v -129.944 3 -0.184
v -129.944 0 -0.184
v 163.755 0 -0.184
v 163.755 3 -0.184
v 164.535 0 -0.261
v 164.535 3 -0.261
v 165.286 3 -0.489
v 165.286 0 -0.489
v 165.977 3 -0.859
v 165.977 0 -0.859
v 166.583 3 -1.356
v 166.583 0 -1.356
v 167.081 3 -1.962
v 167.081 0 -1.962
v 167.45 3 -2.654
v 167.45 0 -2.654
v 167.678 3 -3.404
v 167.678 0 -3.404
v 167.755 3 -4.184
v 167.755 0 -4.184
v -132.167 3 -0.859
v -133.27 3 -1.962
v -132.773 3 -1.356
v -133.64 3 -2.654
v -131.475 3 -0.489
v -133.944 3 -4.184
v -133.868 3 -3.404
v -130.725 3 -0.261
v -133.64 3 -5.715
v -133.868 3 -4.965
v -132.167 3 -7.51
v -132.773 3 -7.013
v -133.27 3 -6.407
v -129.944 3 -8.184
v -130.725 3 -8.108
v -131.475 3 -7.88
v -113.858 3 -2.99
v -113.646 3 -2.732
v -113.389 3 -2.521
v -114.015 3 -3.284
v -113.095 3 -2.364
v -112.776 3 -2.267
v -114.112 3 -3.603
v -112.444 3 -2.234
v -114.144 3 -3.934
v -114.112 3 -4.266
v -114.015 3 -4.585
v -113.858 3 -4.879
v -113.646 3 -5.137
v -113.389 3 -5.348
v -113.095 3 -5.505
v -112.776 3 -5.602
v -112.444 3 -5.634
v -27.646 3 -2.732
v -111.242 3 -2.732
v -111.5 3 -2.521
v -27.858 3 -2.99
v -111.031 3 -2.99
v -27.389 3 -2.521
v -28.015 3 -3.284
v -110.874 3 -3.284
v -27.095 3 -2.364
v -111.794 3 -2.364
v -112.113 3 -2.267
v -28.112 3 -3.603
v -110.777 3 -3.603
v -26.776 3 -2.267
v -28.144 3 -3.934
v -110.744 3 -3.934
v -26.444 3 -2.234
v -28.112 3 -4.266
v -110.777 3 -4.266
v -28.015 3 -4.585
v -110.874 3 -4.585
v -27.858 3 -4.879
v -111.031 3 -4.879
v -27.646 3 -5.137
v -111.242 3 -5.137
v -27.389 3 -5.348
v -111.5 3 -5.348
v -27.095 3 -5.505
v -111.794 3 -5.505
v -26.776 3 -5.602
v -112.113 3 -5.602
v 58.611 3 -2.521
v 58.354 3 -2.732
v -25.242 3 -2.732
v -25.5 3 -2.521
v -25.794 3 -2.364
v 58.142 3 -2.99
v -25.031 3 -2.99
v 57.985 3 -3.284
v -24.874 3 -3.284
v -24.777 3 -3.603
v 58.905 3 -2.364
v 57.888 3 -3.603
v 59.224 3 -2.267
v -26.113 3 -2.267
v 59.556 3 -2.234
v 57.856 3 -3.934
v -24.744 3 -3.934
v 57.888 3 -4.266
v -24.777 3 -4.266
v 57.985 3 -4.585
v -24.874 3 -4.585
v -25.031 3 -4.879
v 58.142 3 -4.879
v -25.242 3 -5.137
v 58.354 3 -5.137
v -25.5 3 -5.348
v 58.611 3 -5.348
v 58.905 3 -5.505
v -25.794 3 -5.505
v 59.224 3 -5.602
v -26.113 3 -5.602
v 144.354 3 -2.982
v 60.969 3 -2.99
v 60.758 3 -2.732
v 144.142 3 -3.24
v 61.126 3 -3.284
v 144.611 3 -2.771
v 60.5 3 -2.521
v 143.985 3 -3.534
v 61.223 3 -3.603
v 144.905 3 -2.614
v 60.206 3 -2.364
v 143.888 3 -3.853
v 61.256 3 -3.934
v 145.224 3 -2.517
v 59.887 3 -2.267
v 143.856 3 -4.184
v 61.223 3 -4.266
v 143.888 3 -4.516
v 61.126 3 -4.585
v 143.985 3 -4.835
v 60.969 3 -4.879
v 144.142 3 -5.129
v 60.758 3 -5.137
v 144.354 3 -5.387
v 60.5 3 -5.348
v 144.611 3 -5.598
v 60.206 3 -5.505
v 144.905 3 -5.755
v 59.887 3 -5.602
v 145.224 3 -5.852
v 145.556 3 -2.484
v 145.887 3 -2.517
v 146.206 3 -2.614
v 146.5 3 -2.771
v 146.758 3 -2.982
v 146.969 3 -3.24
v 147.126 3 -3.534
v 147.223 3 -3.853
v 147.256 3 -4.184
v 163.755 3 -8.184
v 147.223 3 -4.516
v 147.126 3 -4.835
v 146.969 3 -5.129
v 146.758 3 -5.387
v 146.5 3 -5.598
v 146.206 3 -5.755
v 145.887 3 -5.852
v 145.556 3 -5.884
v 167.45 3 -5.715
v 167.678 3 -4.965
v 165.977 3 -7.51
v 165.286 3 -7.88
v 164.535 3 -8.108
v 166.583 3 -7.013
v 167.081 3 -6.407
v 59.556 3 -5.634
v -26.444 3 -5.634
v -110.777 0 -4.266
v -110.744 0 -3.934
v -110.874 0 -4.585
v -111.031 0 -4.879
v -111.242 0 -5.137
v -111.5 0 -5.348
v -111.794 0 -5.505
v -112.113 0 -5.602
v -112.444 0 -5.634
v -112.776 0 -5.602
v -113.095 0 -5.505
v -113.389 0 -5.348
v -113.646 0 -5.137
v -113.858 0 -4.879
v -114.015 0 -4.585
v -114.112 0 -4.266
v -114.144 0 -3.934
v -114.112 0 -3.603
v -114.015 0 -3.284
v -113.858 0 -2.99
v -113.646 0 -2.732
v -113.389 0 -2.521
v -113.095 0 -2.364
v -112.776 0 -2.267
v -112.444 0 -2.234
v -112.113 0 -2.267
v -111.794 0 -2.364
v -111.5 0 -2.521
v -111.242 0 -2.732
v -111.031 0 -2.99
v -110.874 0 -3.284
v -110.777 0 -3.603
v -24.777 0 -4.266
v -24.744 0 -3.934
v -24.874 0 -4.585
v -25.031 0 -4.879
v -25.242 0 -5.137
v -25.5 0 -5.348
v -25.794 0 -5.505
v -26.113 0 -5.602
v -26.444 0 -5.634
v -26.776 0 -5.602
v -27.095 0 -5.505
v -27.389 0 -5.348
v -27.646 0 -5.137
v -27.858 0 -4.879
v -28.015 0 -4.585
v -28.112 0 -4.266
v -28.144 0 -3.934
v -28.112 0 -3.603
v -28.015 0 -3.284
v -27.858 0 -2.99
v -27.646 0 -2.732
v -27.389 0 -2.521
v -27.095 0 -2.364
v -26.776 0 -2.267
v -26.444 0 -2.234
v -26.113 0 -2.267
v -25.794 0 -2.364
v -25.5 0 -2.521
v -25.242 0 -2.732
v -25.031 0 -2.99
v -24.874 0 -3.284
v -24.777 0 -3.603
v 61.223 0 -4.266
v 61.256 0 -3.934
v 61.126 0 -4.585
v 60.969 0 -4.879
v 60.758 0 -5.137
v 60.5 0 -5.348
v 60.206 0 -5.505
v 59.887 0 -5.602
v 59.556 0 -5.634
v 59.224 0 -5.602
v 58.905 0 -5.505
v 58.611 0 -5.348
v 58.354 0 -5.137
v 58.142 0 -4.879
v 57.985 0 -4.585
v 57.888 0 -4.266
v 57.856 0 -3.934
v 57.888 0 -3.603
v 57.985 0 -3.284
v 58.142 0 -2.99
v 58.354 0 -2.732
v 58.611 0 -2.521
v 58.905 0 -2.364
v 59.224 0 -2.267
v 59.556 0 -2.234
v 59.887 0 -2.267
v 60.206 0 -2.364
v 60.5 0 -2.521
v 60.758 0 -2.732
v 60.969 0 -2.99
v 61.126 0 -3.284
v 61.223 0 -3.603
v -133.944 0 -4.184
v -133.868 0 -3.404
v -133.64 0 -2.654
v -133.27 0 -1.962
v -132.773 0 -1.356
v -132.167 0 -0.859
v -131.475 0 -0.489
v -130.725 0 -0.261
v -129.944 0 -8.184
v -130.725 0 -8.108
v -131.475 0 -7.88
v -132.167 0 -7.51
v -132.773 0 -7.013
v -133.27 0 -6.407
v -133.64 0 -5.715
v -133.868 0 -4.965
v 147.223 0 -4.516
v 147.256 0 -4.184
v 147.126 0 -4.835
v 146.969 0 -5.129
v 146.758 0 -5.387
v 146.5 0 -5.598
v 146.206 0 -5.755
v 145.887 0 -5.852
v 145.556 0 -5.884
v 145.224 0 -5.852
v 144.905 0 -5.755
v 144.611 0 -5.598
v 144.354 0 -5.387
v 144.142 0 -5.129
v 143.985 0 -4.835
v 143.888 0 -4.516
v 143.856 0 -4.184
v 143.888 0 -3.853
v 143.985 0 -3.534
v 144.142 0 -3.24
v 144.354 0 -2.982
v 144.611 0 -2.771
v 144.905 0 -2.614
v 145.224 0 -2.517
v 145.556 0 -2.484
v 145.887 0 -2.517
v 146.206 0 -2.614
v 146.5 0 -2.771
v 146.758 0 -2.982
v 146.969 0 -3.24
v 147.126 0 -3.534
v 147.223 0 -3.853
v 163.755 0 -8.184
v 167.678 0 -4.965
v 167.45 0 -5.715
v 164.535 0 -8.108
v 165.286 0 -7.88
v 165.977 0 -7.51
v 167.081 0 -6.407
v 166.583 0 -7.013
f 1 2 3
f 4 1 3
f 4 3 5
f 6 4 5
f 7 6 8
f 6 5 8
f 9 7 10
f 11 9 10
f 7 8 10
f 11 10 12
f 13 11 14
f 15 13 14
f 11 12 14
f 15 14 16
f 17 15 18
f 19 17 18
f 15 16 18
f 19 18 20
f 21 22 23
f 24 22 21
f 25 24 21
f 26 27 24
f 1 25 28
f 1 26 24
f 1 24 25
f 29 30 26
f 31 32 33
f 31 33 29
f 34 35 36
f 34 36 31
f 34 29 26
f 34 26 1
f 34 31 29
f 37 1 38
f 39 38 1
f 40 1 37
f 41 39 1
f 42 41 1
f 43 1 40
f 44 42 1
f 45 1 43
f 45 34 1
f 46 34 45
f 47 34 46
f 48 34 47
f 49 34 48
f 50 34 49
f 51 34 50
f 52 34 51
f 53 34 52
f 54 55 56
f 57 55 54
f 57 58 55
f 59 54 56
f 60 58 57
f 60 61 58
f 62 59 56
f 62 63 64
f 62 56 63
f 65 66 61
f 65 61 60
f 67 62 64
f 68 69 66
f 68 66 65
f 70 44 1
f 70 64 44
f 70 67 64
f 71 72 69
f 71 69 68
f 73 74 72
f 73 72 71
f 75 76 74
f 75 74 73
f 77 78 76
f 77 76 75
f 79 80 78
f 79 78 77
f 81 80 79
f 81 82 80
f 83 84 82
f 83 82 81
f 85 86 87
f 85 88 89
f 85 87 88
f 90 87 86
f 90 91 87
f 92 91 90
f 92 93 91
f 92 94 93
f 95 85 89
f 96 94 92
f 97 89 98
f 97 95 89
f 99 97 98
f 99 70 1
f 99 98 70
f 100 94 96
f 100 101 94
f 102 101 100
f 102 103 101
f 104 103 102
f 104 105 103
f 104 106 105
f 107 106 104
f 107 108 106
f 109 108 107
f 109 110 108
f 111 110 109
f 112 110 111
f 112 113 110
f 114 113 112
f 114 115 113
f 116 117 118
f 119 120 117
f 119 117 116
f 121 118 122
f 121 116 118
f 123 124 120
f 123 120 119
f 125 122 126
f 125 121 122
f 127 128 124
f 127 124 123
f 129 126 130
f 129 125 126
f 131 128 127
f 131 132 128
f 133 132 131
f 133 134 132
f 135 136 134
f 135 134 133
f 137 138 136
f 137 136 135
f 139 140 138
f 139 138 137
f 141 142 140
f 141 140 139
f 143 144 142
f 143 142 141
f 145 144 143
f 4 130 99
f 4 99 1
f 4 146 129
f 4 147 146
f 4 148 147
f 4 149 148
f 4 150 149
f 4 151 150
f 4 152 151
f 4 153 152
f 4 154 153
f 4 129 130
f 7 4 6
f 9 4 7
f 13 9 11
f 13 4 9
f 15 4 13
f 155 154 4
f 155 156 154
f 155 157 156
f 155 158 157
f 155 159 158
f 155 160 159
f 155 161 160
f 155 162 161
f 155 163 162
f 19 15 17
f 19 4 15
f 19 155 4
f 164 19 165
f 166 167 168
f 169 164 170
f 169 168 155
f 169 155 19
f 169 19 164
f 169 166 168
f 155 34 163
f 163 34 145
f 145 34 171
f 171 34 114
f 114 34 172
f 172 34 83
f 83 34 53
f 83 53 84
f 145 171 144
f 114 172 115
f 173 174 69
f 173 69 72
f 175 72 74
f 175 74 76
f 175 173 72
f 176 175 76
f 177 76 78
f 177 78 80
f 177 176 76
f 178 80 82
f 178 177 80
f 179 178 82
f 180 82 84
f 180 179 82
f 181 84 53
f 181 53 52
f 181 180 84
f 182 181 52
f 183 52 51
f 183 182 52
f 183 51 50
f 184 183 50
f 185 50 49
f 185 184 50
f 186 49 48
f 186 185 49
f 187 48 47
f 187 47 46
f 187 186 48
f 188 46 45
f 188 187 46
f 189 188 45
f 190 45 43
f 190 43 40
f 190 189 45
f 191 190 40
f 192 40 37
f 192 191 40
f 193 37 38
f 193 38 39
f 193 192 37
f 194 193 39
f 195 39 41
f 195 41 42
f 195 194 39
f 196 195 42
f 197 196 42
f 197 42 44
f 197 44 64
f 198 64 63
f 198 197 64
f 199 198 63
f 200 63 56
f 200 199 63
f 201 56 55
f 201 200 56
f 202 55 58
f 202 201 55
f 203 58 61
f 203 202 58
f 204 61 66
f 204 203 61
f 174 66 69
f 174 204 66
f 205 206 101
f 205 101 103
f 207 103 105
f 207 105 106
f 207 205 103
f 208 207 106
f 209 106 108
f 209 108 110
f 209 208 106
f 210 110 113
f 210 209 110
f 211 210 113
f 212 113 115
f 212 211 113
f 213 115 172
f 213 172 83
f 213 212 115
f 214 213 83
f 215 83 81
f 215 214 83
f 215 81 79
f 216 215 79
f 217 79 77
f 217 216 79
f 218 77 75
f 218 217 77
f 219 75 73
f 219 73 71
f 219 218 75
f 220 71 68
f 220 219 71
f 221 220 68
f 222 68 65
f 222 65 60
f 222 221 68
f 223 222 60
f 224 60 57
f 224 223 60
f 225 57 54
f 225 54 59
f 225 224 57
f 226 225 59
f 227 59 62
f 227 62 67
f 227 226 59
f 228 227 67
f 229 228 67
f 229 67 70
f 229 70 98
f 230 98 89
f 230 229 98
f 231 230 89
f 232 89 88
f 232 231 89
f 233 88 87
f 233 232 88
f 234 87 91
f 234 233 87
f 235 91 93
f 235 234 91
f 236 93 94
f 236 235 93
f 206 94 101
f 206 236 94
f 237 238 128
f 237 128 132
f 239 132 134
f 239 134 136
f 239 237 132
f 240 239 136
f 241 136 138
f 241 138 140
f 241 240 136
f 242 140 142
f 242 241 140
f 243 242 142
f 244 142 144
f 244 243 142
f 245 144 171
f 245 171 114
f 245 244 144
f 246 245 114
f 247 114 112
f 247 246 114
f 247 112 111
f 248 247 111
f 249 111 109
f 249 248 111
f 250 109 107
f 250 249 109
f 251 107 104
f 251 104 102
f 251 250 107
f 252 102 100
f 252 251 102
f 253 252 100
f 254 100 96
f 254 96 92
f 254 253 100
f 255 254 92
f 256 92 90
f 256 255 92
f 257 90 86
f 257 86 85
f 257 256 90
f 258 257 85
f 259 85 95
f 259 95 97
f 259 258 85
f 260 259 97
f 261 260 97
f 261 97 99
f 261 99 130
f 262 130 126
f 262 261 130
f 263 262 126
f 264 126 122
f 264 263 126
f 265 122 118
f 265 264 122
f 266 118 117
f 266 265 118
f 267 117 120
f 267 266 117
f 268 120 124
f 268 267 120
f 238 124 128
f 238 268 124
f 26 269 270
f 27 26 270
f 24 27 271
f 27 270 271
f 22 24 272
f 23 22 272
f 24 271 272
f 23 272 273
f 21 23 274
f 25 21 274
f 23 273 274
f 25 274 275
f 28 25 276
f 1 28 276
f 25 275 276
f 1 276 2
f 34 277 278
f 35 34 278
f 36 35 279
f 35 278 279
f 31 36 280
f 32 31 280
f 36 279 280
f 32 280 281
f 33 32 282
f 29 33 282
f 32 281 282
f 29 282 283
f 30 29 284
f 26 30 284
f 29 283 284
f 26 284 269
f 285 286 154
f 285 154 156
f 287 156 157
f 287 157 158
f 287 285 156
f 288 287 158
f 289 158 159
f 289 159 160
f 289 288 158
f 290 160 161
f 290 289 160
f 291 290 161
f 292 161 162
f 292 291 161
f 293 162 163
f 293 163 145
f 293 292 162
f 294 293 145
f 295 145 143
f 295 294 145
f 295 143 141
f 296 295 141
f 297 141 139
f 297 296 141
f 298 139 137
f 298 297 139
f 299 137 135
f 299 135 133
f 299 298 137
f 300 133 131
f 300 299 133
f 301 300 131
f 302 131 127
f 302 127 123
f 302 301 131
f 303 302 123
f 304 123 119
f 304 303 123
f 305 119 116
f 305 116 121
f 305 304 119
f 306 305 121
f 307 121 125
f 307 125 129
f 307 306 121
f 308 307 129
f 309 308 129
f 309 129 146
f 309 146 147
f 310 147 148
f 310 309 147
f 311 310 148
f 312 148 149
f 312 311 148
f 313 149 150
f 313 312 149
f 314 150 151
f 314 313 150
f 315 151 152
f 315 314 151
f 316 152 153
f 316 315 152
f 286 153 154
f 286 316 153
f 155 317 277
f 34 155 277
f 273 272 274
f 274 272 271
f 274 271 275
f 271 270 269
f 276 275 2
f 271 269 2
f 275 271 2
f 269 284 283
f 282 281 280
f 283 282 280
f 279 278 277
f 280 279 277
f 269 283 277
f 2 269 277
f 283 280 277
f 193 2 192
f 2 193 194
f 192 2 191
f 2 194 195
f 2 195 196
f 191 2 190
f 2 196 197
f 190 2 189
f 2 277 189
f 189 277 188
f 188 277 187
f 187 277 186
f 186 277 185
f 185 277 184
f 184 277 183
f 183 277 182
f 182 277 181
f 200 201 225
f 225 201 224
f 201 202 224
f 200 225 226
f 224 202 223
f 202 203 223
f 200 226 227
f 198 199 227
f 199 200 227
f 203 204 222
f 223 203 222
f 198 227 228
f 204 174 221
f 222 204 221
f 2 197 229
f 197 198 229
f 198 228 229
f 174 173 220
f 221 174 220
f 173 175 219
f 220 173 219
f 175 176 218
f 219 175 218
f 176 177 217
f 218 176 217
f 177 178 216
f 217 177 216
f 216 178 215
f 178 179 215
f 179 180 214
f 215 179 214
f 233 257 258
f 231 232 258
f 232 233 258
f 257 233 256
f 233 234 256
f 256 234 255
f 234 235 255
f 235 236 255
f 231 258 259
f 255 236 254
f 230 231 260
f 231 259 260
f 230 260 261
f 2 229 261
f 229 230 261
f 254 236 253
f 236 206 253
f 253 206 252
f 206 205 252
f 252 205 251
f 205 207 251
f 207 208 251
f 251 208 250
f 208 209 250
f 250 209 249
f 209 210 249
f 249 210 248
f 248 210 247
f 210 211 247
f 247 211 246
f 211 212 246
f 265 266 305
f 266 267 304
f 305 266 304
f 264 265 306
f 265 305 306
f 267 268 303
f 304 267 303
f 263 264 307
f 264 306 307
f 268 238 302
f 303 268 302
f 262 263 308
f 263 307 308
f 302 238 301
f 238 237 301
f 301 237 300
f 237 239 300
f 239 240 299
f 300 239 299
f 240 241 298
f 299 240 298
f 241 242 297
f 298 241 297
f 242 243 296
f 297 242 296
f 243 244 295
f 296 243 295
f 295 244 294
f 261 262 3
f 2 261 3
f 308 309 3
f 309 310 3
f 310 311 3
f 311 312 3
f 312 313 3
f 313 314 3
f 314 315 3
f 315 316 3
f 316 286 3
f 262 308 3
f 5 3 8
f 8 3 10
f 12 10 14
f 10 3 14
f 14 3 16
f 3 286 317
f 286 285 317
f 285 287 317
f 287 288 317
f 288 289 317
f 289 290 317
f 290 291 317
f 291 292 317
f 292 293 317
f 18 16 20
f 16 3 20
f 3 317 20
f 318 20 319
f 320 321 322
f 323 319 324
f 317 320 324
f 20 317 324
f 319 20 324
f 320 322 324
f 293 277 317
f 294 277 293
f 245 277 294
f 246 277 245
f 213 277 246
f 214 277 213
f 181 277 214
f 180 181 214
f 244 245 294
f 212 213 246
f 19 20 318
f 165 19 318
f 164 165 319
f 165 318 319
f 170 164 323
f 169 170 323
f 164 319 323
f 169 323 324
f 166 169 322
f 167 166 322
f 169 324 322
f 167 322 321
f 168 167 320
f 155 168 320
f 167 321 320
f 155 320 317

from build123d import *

# Parameters (mm, degrees)
SKETCH2_R           = 1.7
BOSS_EXTRUDE1_DEPTH = 3


with BuildPart() as part:
    # Sketch2 → Boss-Extrude1 (new body)
    with BuildSketch(Plane(origin=(0, 0, 0), x_dir=(1, 0, 0), z_dir=(0, 1, 0))):
        with BuildLine():
            Line((-129.94436932, 0.184481604), (163.75498068, 0.184481604))
            ThreePointArc((163.75498068, 0.184481604), (166.583407805, 1.356054479), (167.75498068, 4.184481604))
            ThreePointArc((167.75498068, 4.184481604), (166.583407805, 7.012908729), (163.75498068, 8.184481604))
            Line((163.75498068, 8.184481604), (-129.94436932, 8.184481604))
            ThreePointArc((-129.94436932, 8.184481604), (-132.772796445, 7.012908729), (-133.94436932, 4.184481604))
            ThreePointArc((-133.94436932, 4.184481604), (-132.772796445, 1.356054479), (-129.94436932, 0.184481604))
        make_face()
        with Locations((145.55563068, 4.184481604)):
            Circle(SKETCH2_R, mode=Mode.SUBTRACT)
        with Locations((59.55563068, 3.934481604)):
            Circle(SKETCH2_R, mode=Mode.SUBTRACT)
        with Locations((-112.44436932, 3.934481604)):
            Circle(SKETCH2_R, mode=Mode.SUBTRACT)
        with Locations((-26.44436932, 3.934481604)):
            Circle(SKETCH2_R, mode=Mode.SUBTRACT)
    extrude(amount=BOSS_EXTRUDE1_DEPTH)


solid = part.part
